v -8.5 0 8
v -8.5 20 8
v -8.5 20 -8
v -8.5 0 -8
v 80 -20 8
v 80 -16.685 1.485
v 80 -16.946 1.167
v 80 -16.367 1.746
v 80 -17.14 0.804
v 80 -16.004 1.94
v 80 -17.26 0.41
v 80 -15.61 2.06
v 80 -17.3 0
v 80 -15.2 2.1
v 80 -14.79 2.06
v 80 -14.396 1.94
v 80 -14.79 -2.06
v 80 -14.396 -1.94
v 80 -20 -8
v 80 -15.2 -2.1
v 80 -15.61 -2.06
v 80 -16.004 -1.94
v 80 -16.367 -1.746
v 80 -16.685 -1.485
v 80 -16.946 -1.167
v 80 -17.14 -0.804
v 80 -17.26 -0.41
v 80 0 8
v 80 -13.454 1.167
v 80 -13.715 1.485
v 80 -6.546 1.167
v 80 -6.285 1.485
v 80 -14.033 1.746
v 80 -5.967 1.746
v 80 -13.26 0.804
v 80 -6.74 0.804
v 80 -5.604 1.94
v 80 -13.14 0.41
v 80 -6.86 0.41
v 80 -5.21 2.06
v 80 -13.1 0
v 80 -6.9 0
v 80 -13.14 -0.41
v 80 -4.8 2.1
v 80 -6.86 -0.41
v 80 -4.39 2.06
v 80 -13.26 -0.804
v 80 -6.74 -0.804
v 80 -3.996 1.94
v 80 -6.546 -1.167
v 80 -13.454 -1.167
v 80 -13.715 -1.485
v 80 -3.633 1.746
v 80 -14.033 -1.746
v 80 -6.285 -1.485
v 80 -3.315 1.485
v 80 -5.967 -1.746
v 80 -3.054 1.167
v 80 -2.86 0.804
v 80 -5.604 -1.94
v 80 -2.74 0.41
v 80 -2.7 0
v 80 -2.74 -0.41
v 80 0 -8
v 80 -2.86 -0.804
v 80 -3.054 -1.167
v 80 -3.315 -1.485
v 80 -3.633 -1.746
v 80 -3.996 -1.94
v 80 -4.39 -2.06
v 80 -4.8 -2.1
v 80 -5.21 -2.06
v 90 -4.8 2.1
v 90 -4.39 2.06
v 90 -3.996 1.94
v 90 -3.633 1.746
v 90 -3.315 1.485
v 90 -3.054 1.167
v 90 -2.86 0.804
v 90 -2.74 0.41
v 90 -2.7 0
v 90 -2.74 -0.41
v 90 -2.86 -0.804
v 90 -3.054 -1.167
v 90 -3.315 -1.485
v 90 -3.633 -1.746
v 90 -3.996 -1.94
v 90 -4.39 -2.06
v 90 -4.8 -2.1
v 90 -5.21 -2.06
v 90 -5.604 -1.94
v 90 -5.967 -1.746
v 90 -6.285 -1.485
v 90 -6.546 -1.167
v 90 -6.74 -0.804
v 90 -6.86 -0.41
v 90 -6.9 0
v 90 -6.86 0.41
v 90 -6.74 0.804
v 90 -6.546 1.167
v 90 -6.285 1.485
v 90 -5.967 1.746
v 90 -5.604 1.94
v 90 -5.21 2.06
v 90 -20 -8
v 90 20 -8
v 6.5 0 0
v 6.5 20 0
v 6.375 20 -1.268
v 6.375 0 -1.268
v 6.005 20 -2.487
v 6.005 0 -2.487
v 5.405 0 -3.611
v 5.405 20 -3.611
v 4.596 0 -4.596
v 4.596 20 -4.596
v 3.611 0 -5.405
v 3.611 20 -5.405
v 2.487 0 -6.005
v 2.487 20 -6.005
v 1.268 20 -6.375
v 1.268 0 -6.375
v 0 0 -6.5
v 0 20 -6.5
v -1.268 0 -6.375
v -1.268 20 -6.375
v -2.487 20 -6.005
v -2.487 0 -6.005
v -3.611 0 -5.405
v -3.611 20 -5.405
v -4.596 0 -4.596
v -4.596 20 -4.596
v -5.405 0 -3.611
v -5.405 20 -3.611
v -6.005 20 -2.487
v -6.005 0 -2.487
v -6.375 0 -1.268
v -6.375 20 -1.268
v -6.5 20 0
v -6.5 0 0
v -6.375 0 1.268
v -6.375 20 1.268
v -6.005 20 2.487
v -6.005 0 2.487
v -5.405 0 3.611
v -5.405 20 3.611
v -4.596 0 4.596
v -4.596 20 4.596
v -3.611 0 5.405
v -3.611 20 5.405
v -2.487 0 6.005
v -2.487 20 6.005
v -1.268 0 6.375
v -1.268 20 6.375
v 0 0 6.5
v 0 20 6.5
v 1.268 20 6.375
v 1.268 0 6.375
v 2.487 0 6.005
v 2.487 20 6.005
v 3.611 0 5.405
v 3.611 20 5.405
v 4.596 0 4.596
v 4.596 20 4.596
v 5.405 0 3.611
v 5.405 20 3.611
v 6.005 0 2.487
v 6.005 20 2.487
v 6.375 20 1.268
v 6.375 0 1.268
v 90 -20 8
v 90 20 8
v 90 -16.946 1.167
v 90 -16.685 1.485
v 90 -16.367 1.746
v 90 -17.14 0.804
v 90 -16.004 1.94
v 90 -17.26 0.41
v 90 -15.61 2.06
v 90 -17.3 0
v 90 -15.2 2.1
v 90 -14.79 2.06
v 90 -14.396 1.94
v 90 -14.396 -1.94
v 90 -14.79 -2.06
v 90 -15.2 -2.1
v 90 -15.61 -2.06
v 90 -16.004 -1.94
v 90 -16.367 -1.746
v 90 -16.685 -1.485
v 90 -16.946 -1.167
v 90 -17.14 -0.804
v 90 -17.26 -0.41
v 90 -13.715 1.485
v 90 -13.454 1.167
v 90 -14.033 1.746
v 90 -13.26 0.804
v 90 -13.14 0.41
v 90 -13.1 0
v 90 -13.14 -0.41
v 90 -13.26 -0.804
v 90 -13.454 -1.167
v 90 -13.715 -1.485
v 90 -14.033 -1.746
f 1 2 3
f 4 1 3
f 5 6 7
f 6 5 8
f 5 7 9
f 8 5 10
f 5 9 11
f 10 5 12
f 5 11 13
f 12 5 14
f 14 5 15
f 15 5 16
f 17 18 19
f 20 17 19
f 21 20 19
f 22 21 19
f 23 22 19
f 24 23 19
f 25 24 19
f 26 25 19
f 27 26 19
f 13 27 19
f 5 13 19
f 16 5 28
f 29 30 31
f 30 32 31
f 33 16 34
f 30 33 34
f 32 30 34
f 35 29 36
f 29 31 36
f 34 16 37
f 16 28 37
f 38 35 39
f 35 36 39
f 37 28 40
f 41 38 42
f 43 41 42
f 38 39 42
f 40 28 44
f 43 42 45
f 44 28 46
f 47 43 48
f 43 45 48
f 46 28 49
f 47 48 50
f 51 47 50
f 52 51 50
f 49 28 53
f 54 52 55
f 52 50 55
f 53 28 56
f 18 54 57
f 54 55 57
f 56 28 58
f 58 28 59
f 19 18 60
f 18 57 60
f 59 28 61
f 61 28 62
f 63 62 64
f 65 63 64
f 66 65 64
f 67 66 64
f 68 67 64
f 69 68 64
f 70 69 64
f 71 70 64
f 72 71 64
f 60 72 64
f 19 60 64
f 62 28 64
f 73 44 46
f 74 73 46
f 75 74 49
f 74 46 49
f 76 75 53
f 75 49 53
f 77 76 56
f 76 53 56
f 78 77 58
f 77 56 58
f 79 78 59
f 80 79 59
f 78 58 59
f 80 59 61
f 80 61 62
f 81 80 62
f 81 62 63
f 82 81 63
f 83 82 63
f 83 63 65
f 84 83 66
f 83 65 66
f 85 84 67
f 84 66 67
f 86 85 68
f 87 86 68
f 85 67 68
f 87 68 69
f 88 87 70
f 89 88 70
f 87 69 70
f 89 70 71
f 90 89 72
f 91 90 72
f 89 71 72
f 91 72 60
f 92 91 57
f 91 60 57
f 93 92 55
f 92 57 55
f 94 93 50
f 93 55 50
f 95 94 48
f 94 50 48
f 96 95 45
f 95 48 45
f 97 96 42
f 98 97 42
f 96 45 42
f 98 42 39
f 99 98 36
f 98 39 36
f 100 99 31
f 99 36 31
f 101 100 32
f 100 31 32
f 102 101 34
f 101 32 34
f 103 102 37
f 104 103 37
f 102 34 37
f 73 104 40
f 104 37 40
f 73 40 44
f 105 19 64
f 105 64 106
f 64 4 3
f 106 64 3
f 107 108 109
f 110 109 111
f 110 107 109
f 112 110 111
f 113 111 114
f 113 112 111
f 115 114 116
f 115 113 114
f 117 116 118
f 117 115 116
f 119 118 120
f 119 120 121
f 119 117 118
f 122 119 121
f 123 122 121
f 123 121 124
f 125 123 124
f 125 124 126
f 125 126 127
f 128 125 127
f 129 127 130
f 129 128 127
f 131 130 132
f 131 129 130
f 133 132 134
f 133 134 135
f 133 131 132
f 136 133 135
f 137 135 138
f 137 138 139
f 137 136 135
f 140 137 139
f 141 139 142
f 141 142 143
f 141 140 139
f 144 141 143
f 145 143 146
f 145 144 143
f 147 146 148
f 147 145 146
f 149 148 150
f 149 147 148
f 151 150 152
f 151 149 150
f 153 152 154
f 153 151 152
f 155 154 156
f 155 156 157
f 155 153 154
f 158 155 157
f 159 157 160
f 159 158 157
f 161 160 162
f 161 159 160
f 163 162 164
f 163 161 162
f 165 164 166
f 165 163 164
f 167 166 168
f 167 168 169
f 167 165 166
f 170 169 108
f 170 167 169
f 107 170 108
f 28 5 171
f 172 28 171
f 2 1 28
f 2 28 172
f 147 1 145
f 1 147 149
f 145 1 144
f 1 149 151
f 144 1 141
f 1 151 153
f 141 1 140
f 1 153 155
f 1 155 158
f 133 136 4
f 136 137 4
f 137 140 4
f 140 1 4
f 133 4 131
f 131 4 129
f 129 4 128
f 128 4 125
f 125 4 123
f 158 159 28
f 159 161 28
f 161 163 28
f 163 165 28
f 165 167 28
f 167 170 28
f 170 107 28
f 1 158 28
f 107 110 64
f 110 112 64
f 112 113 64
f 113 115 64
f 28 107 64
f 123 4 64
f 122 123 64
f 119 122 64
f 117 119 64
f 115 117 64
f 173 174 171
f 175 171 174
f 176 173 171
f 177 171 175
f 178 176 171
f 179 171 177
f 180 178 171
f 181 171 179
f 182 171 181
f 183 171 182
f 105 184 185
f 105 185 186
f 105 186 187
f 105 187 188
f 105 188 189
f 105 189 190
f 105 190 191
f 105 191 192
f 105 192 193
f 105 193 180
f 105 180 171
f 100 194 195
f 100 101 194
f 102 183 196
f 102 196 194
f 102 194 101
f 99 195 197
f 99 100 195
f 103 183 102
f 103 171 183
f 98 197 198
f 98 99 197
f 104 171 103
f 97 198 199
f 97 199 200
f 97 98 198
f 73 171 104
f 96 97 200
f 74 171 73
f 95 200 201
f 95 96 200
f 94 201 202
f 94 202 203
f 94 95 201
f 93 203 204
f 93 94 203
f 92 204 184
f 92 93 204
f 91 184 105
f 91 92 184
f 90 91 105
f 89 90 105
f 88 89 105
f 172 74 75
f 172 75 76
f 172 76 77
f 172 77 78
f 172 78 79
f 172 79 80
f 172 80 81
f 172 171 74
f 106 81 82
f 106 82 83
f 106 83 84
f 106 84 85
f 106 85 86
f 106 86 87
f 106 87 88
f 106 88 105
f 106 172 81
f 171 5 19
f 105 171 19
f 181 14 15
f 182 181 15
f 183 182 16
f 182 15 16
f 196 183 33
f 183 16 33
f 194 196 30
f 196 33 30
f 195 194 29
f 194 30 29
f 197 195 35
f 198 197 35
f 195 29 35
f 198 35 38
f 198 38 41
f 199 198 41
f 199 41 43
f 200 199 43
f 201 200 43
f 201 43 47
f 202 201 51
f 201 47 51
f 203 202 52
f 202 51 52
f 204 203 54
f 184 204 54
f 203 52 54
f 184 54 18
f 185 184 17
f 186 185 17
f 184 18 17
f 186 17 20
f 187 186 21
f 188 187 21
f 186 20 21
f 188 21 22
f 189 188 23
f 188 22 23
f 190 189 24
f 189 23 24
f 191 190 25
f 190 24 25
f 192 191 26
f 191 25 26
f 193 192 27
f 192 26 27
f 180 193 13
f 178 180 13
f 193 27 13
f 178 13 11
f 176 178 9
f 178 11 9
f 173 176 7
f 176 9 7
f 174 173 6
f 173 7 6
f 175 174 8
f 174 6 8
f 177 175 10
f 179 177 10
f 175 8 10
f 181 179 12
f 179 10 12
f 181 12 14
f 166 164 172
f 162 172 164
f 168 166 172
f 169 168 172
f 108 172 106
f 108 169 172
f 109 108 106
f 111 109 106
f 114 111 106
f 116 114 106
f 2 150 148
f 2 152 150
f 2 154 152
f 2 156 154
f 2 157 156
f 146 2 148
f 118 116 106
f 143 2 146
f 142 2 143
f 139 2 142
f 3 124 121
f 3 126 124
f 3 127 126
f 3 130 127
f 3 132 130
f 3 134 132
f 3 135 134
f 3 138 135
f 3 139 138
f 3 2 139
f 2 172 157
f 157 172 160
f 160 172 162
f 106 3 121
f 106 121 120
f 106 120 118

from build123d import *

# Parameters (mm, degrees)
SKETCH_1_W          = 88.5
SKETCH_1_H          = 16
SKETCH_1_R          = 6.5
EXTRUDE_1_DEPTH     = 20
SKETCH_2_W          = 16
SKETCH_2_H          = 40
EXTRUDE_2_DEPTH     = 10
SKETCH_3_R          = 2.1
CUT_EXTRUDE_1_DEPTH = 10


with BuildPart() as part:
    # 草图1 → 凸台-拉伸1 (new body)
    with BuildSketch(Plane(origin=(0, 0, 0), x_dir=(1, 0, 0), z_dir=(0, 1, 0))):
        with Locations((35.75, 0)):
            Rectangle(SKETCH_1_W, SKETCH_1_H)
        Circle(SKETCH_1_R, mode=Mode.SUBTRACT)
    extrude(amount=EXTRUDE_1_DEPTH)

    # 草图2 → 凸台-拉伸2 (add)
    with BuildSketch(Plane(origin=(80, 0, 0), x_dir=(0, 0, -1), z_dir=(1, 0, 0))):
        Rectangle(SKETCH_2_W, SKETCH_2_H)
    extrude(amount=EXTRUDE_2_DEPTH)

    # 草图3 → 切除-拉伸1 (cut)
    with BuildSketch(Plane.ZY.offset(-80)):
        with Locations((0, -4.8)):
            Circle(SKETCH_3_R)
        with Locations((0, -15.2)):
            Circle(SKETCH_3_R)
    extrude(amount=-CUT_EXTRUDE_1_DEPTH, mode=Mode.SUBTRACT)


solid = part.part
